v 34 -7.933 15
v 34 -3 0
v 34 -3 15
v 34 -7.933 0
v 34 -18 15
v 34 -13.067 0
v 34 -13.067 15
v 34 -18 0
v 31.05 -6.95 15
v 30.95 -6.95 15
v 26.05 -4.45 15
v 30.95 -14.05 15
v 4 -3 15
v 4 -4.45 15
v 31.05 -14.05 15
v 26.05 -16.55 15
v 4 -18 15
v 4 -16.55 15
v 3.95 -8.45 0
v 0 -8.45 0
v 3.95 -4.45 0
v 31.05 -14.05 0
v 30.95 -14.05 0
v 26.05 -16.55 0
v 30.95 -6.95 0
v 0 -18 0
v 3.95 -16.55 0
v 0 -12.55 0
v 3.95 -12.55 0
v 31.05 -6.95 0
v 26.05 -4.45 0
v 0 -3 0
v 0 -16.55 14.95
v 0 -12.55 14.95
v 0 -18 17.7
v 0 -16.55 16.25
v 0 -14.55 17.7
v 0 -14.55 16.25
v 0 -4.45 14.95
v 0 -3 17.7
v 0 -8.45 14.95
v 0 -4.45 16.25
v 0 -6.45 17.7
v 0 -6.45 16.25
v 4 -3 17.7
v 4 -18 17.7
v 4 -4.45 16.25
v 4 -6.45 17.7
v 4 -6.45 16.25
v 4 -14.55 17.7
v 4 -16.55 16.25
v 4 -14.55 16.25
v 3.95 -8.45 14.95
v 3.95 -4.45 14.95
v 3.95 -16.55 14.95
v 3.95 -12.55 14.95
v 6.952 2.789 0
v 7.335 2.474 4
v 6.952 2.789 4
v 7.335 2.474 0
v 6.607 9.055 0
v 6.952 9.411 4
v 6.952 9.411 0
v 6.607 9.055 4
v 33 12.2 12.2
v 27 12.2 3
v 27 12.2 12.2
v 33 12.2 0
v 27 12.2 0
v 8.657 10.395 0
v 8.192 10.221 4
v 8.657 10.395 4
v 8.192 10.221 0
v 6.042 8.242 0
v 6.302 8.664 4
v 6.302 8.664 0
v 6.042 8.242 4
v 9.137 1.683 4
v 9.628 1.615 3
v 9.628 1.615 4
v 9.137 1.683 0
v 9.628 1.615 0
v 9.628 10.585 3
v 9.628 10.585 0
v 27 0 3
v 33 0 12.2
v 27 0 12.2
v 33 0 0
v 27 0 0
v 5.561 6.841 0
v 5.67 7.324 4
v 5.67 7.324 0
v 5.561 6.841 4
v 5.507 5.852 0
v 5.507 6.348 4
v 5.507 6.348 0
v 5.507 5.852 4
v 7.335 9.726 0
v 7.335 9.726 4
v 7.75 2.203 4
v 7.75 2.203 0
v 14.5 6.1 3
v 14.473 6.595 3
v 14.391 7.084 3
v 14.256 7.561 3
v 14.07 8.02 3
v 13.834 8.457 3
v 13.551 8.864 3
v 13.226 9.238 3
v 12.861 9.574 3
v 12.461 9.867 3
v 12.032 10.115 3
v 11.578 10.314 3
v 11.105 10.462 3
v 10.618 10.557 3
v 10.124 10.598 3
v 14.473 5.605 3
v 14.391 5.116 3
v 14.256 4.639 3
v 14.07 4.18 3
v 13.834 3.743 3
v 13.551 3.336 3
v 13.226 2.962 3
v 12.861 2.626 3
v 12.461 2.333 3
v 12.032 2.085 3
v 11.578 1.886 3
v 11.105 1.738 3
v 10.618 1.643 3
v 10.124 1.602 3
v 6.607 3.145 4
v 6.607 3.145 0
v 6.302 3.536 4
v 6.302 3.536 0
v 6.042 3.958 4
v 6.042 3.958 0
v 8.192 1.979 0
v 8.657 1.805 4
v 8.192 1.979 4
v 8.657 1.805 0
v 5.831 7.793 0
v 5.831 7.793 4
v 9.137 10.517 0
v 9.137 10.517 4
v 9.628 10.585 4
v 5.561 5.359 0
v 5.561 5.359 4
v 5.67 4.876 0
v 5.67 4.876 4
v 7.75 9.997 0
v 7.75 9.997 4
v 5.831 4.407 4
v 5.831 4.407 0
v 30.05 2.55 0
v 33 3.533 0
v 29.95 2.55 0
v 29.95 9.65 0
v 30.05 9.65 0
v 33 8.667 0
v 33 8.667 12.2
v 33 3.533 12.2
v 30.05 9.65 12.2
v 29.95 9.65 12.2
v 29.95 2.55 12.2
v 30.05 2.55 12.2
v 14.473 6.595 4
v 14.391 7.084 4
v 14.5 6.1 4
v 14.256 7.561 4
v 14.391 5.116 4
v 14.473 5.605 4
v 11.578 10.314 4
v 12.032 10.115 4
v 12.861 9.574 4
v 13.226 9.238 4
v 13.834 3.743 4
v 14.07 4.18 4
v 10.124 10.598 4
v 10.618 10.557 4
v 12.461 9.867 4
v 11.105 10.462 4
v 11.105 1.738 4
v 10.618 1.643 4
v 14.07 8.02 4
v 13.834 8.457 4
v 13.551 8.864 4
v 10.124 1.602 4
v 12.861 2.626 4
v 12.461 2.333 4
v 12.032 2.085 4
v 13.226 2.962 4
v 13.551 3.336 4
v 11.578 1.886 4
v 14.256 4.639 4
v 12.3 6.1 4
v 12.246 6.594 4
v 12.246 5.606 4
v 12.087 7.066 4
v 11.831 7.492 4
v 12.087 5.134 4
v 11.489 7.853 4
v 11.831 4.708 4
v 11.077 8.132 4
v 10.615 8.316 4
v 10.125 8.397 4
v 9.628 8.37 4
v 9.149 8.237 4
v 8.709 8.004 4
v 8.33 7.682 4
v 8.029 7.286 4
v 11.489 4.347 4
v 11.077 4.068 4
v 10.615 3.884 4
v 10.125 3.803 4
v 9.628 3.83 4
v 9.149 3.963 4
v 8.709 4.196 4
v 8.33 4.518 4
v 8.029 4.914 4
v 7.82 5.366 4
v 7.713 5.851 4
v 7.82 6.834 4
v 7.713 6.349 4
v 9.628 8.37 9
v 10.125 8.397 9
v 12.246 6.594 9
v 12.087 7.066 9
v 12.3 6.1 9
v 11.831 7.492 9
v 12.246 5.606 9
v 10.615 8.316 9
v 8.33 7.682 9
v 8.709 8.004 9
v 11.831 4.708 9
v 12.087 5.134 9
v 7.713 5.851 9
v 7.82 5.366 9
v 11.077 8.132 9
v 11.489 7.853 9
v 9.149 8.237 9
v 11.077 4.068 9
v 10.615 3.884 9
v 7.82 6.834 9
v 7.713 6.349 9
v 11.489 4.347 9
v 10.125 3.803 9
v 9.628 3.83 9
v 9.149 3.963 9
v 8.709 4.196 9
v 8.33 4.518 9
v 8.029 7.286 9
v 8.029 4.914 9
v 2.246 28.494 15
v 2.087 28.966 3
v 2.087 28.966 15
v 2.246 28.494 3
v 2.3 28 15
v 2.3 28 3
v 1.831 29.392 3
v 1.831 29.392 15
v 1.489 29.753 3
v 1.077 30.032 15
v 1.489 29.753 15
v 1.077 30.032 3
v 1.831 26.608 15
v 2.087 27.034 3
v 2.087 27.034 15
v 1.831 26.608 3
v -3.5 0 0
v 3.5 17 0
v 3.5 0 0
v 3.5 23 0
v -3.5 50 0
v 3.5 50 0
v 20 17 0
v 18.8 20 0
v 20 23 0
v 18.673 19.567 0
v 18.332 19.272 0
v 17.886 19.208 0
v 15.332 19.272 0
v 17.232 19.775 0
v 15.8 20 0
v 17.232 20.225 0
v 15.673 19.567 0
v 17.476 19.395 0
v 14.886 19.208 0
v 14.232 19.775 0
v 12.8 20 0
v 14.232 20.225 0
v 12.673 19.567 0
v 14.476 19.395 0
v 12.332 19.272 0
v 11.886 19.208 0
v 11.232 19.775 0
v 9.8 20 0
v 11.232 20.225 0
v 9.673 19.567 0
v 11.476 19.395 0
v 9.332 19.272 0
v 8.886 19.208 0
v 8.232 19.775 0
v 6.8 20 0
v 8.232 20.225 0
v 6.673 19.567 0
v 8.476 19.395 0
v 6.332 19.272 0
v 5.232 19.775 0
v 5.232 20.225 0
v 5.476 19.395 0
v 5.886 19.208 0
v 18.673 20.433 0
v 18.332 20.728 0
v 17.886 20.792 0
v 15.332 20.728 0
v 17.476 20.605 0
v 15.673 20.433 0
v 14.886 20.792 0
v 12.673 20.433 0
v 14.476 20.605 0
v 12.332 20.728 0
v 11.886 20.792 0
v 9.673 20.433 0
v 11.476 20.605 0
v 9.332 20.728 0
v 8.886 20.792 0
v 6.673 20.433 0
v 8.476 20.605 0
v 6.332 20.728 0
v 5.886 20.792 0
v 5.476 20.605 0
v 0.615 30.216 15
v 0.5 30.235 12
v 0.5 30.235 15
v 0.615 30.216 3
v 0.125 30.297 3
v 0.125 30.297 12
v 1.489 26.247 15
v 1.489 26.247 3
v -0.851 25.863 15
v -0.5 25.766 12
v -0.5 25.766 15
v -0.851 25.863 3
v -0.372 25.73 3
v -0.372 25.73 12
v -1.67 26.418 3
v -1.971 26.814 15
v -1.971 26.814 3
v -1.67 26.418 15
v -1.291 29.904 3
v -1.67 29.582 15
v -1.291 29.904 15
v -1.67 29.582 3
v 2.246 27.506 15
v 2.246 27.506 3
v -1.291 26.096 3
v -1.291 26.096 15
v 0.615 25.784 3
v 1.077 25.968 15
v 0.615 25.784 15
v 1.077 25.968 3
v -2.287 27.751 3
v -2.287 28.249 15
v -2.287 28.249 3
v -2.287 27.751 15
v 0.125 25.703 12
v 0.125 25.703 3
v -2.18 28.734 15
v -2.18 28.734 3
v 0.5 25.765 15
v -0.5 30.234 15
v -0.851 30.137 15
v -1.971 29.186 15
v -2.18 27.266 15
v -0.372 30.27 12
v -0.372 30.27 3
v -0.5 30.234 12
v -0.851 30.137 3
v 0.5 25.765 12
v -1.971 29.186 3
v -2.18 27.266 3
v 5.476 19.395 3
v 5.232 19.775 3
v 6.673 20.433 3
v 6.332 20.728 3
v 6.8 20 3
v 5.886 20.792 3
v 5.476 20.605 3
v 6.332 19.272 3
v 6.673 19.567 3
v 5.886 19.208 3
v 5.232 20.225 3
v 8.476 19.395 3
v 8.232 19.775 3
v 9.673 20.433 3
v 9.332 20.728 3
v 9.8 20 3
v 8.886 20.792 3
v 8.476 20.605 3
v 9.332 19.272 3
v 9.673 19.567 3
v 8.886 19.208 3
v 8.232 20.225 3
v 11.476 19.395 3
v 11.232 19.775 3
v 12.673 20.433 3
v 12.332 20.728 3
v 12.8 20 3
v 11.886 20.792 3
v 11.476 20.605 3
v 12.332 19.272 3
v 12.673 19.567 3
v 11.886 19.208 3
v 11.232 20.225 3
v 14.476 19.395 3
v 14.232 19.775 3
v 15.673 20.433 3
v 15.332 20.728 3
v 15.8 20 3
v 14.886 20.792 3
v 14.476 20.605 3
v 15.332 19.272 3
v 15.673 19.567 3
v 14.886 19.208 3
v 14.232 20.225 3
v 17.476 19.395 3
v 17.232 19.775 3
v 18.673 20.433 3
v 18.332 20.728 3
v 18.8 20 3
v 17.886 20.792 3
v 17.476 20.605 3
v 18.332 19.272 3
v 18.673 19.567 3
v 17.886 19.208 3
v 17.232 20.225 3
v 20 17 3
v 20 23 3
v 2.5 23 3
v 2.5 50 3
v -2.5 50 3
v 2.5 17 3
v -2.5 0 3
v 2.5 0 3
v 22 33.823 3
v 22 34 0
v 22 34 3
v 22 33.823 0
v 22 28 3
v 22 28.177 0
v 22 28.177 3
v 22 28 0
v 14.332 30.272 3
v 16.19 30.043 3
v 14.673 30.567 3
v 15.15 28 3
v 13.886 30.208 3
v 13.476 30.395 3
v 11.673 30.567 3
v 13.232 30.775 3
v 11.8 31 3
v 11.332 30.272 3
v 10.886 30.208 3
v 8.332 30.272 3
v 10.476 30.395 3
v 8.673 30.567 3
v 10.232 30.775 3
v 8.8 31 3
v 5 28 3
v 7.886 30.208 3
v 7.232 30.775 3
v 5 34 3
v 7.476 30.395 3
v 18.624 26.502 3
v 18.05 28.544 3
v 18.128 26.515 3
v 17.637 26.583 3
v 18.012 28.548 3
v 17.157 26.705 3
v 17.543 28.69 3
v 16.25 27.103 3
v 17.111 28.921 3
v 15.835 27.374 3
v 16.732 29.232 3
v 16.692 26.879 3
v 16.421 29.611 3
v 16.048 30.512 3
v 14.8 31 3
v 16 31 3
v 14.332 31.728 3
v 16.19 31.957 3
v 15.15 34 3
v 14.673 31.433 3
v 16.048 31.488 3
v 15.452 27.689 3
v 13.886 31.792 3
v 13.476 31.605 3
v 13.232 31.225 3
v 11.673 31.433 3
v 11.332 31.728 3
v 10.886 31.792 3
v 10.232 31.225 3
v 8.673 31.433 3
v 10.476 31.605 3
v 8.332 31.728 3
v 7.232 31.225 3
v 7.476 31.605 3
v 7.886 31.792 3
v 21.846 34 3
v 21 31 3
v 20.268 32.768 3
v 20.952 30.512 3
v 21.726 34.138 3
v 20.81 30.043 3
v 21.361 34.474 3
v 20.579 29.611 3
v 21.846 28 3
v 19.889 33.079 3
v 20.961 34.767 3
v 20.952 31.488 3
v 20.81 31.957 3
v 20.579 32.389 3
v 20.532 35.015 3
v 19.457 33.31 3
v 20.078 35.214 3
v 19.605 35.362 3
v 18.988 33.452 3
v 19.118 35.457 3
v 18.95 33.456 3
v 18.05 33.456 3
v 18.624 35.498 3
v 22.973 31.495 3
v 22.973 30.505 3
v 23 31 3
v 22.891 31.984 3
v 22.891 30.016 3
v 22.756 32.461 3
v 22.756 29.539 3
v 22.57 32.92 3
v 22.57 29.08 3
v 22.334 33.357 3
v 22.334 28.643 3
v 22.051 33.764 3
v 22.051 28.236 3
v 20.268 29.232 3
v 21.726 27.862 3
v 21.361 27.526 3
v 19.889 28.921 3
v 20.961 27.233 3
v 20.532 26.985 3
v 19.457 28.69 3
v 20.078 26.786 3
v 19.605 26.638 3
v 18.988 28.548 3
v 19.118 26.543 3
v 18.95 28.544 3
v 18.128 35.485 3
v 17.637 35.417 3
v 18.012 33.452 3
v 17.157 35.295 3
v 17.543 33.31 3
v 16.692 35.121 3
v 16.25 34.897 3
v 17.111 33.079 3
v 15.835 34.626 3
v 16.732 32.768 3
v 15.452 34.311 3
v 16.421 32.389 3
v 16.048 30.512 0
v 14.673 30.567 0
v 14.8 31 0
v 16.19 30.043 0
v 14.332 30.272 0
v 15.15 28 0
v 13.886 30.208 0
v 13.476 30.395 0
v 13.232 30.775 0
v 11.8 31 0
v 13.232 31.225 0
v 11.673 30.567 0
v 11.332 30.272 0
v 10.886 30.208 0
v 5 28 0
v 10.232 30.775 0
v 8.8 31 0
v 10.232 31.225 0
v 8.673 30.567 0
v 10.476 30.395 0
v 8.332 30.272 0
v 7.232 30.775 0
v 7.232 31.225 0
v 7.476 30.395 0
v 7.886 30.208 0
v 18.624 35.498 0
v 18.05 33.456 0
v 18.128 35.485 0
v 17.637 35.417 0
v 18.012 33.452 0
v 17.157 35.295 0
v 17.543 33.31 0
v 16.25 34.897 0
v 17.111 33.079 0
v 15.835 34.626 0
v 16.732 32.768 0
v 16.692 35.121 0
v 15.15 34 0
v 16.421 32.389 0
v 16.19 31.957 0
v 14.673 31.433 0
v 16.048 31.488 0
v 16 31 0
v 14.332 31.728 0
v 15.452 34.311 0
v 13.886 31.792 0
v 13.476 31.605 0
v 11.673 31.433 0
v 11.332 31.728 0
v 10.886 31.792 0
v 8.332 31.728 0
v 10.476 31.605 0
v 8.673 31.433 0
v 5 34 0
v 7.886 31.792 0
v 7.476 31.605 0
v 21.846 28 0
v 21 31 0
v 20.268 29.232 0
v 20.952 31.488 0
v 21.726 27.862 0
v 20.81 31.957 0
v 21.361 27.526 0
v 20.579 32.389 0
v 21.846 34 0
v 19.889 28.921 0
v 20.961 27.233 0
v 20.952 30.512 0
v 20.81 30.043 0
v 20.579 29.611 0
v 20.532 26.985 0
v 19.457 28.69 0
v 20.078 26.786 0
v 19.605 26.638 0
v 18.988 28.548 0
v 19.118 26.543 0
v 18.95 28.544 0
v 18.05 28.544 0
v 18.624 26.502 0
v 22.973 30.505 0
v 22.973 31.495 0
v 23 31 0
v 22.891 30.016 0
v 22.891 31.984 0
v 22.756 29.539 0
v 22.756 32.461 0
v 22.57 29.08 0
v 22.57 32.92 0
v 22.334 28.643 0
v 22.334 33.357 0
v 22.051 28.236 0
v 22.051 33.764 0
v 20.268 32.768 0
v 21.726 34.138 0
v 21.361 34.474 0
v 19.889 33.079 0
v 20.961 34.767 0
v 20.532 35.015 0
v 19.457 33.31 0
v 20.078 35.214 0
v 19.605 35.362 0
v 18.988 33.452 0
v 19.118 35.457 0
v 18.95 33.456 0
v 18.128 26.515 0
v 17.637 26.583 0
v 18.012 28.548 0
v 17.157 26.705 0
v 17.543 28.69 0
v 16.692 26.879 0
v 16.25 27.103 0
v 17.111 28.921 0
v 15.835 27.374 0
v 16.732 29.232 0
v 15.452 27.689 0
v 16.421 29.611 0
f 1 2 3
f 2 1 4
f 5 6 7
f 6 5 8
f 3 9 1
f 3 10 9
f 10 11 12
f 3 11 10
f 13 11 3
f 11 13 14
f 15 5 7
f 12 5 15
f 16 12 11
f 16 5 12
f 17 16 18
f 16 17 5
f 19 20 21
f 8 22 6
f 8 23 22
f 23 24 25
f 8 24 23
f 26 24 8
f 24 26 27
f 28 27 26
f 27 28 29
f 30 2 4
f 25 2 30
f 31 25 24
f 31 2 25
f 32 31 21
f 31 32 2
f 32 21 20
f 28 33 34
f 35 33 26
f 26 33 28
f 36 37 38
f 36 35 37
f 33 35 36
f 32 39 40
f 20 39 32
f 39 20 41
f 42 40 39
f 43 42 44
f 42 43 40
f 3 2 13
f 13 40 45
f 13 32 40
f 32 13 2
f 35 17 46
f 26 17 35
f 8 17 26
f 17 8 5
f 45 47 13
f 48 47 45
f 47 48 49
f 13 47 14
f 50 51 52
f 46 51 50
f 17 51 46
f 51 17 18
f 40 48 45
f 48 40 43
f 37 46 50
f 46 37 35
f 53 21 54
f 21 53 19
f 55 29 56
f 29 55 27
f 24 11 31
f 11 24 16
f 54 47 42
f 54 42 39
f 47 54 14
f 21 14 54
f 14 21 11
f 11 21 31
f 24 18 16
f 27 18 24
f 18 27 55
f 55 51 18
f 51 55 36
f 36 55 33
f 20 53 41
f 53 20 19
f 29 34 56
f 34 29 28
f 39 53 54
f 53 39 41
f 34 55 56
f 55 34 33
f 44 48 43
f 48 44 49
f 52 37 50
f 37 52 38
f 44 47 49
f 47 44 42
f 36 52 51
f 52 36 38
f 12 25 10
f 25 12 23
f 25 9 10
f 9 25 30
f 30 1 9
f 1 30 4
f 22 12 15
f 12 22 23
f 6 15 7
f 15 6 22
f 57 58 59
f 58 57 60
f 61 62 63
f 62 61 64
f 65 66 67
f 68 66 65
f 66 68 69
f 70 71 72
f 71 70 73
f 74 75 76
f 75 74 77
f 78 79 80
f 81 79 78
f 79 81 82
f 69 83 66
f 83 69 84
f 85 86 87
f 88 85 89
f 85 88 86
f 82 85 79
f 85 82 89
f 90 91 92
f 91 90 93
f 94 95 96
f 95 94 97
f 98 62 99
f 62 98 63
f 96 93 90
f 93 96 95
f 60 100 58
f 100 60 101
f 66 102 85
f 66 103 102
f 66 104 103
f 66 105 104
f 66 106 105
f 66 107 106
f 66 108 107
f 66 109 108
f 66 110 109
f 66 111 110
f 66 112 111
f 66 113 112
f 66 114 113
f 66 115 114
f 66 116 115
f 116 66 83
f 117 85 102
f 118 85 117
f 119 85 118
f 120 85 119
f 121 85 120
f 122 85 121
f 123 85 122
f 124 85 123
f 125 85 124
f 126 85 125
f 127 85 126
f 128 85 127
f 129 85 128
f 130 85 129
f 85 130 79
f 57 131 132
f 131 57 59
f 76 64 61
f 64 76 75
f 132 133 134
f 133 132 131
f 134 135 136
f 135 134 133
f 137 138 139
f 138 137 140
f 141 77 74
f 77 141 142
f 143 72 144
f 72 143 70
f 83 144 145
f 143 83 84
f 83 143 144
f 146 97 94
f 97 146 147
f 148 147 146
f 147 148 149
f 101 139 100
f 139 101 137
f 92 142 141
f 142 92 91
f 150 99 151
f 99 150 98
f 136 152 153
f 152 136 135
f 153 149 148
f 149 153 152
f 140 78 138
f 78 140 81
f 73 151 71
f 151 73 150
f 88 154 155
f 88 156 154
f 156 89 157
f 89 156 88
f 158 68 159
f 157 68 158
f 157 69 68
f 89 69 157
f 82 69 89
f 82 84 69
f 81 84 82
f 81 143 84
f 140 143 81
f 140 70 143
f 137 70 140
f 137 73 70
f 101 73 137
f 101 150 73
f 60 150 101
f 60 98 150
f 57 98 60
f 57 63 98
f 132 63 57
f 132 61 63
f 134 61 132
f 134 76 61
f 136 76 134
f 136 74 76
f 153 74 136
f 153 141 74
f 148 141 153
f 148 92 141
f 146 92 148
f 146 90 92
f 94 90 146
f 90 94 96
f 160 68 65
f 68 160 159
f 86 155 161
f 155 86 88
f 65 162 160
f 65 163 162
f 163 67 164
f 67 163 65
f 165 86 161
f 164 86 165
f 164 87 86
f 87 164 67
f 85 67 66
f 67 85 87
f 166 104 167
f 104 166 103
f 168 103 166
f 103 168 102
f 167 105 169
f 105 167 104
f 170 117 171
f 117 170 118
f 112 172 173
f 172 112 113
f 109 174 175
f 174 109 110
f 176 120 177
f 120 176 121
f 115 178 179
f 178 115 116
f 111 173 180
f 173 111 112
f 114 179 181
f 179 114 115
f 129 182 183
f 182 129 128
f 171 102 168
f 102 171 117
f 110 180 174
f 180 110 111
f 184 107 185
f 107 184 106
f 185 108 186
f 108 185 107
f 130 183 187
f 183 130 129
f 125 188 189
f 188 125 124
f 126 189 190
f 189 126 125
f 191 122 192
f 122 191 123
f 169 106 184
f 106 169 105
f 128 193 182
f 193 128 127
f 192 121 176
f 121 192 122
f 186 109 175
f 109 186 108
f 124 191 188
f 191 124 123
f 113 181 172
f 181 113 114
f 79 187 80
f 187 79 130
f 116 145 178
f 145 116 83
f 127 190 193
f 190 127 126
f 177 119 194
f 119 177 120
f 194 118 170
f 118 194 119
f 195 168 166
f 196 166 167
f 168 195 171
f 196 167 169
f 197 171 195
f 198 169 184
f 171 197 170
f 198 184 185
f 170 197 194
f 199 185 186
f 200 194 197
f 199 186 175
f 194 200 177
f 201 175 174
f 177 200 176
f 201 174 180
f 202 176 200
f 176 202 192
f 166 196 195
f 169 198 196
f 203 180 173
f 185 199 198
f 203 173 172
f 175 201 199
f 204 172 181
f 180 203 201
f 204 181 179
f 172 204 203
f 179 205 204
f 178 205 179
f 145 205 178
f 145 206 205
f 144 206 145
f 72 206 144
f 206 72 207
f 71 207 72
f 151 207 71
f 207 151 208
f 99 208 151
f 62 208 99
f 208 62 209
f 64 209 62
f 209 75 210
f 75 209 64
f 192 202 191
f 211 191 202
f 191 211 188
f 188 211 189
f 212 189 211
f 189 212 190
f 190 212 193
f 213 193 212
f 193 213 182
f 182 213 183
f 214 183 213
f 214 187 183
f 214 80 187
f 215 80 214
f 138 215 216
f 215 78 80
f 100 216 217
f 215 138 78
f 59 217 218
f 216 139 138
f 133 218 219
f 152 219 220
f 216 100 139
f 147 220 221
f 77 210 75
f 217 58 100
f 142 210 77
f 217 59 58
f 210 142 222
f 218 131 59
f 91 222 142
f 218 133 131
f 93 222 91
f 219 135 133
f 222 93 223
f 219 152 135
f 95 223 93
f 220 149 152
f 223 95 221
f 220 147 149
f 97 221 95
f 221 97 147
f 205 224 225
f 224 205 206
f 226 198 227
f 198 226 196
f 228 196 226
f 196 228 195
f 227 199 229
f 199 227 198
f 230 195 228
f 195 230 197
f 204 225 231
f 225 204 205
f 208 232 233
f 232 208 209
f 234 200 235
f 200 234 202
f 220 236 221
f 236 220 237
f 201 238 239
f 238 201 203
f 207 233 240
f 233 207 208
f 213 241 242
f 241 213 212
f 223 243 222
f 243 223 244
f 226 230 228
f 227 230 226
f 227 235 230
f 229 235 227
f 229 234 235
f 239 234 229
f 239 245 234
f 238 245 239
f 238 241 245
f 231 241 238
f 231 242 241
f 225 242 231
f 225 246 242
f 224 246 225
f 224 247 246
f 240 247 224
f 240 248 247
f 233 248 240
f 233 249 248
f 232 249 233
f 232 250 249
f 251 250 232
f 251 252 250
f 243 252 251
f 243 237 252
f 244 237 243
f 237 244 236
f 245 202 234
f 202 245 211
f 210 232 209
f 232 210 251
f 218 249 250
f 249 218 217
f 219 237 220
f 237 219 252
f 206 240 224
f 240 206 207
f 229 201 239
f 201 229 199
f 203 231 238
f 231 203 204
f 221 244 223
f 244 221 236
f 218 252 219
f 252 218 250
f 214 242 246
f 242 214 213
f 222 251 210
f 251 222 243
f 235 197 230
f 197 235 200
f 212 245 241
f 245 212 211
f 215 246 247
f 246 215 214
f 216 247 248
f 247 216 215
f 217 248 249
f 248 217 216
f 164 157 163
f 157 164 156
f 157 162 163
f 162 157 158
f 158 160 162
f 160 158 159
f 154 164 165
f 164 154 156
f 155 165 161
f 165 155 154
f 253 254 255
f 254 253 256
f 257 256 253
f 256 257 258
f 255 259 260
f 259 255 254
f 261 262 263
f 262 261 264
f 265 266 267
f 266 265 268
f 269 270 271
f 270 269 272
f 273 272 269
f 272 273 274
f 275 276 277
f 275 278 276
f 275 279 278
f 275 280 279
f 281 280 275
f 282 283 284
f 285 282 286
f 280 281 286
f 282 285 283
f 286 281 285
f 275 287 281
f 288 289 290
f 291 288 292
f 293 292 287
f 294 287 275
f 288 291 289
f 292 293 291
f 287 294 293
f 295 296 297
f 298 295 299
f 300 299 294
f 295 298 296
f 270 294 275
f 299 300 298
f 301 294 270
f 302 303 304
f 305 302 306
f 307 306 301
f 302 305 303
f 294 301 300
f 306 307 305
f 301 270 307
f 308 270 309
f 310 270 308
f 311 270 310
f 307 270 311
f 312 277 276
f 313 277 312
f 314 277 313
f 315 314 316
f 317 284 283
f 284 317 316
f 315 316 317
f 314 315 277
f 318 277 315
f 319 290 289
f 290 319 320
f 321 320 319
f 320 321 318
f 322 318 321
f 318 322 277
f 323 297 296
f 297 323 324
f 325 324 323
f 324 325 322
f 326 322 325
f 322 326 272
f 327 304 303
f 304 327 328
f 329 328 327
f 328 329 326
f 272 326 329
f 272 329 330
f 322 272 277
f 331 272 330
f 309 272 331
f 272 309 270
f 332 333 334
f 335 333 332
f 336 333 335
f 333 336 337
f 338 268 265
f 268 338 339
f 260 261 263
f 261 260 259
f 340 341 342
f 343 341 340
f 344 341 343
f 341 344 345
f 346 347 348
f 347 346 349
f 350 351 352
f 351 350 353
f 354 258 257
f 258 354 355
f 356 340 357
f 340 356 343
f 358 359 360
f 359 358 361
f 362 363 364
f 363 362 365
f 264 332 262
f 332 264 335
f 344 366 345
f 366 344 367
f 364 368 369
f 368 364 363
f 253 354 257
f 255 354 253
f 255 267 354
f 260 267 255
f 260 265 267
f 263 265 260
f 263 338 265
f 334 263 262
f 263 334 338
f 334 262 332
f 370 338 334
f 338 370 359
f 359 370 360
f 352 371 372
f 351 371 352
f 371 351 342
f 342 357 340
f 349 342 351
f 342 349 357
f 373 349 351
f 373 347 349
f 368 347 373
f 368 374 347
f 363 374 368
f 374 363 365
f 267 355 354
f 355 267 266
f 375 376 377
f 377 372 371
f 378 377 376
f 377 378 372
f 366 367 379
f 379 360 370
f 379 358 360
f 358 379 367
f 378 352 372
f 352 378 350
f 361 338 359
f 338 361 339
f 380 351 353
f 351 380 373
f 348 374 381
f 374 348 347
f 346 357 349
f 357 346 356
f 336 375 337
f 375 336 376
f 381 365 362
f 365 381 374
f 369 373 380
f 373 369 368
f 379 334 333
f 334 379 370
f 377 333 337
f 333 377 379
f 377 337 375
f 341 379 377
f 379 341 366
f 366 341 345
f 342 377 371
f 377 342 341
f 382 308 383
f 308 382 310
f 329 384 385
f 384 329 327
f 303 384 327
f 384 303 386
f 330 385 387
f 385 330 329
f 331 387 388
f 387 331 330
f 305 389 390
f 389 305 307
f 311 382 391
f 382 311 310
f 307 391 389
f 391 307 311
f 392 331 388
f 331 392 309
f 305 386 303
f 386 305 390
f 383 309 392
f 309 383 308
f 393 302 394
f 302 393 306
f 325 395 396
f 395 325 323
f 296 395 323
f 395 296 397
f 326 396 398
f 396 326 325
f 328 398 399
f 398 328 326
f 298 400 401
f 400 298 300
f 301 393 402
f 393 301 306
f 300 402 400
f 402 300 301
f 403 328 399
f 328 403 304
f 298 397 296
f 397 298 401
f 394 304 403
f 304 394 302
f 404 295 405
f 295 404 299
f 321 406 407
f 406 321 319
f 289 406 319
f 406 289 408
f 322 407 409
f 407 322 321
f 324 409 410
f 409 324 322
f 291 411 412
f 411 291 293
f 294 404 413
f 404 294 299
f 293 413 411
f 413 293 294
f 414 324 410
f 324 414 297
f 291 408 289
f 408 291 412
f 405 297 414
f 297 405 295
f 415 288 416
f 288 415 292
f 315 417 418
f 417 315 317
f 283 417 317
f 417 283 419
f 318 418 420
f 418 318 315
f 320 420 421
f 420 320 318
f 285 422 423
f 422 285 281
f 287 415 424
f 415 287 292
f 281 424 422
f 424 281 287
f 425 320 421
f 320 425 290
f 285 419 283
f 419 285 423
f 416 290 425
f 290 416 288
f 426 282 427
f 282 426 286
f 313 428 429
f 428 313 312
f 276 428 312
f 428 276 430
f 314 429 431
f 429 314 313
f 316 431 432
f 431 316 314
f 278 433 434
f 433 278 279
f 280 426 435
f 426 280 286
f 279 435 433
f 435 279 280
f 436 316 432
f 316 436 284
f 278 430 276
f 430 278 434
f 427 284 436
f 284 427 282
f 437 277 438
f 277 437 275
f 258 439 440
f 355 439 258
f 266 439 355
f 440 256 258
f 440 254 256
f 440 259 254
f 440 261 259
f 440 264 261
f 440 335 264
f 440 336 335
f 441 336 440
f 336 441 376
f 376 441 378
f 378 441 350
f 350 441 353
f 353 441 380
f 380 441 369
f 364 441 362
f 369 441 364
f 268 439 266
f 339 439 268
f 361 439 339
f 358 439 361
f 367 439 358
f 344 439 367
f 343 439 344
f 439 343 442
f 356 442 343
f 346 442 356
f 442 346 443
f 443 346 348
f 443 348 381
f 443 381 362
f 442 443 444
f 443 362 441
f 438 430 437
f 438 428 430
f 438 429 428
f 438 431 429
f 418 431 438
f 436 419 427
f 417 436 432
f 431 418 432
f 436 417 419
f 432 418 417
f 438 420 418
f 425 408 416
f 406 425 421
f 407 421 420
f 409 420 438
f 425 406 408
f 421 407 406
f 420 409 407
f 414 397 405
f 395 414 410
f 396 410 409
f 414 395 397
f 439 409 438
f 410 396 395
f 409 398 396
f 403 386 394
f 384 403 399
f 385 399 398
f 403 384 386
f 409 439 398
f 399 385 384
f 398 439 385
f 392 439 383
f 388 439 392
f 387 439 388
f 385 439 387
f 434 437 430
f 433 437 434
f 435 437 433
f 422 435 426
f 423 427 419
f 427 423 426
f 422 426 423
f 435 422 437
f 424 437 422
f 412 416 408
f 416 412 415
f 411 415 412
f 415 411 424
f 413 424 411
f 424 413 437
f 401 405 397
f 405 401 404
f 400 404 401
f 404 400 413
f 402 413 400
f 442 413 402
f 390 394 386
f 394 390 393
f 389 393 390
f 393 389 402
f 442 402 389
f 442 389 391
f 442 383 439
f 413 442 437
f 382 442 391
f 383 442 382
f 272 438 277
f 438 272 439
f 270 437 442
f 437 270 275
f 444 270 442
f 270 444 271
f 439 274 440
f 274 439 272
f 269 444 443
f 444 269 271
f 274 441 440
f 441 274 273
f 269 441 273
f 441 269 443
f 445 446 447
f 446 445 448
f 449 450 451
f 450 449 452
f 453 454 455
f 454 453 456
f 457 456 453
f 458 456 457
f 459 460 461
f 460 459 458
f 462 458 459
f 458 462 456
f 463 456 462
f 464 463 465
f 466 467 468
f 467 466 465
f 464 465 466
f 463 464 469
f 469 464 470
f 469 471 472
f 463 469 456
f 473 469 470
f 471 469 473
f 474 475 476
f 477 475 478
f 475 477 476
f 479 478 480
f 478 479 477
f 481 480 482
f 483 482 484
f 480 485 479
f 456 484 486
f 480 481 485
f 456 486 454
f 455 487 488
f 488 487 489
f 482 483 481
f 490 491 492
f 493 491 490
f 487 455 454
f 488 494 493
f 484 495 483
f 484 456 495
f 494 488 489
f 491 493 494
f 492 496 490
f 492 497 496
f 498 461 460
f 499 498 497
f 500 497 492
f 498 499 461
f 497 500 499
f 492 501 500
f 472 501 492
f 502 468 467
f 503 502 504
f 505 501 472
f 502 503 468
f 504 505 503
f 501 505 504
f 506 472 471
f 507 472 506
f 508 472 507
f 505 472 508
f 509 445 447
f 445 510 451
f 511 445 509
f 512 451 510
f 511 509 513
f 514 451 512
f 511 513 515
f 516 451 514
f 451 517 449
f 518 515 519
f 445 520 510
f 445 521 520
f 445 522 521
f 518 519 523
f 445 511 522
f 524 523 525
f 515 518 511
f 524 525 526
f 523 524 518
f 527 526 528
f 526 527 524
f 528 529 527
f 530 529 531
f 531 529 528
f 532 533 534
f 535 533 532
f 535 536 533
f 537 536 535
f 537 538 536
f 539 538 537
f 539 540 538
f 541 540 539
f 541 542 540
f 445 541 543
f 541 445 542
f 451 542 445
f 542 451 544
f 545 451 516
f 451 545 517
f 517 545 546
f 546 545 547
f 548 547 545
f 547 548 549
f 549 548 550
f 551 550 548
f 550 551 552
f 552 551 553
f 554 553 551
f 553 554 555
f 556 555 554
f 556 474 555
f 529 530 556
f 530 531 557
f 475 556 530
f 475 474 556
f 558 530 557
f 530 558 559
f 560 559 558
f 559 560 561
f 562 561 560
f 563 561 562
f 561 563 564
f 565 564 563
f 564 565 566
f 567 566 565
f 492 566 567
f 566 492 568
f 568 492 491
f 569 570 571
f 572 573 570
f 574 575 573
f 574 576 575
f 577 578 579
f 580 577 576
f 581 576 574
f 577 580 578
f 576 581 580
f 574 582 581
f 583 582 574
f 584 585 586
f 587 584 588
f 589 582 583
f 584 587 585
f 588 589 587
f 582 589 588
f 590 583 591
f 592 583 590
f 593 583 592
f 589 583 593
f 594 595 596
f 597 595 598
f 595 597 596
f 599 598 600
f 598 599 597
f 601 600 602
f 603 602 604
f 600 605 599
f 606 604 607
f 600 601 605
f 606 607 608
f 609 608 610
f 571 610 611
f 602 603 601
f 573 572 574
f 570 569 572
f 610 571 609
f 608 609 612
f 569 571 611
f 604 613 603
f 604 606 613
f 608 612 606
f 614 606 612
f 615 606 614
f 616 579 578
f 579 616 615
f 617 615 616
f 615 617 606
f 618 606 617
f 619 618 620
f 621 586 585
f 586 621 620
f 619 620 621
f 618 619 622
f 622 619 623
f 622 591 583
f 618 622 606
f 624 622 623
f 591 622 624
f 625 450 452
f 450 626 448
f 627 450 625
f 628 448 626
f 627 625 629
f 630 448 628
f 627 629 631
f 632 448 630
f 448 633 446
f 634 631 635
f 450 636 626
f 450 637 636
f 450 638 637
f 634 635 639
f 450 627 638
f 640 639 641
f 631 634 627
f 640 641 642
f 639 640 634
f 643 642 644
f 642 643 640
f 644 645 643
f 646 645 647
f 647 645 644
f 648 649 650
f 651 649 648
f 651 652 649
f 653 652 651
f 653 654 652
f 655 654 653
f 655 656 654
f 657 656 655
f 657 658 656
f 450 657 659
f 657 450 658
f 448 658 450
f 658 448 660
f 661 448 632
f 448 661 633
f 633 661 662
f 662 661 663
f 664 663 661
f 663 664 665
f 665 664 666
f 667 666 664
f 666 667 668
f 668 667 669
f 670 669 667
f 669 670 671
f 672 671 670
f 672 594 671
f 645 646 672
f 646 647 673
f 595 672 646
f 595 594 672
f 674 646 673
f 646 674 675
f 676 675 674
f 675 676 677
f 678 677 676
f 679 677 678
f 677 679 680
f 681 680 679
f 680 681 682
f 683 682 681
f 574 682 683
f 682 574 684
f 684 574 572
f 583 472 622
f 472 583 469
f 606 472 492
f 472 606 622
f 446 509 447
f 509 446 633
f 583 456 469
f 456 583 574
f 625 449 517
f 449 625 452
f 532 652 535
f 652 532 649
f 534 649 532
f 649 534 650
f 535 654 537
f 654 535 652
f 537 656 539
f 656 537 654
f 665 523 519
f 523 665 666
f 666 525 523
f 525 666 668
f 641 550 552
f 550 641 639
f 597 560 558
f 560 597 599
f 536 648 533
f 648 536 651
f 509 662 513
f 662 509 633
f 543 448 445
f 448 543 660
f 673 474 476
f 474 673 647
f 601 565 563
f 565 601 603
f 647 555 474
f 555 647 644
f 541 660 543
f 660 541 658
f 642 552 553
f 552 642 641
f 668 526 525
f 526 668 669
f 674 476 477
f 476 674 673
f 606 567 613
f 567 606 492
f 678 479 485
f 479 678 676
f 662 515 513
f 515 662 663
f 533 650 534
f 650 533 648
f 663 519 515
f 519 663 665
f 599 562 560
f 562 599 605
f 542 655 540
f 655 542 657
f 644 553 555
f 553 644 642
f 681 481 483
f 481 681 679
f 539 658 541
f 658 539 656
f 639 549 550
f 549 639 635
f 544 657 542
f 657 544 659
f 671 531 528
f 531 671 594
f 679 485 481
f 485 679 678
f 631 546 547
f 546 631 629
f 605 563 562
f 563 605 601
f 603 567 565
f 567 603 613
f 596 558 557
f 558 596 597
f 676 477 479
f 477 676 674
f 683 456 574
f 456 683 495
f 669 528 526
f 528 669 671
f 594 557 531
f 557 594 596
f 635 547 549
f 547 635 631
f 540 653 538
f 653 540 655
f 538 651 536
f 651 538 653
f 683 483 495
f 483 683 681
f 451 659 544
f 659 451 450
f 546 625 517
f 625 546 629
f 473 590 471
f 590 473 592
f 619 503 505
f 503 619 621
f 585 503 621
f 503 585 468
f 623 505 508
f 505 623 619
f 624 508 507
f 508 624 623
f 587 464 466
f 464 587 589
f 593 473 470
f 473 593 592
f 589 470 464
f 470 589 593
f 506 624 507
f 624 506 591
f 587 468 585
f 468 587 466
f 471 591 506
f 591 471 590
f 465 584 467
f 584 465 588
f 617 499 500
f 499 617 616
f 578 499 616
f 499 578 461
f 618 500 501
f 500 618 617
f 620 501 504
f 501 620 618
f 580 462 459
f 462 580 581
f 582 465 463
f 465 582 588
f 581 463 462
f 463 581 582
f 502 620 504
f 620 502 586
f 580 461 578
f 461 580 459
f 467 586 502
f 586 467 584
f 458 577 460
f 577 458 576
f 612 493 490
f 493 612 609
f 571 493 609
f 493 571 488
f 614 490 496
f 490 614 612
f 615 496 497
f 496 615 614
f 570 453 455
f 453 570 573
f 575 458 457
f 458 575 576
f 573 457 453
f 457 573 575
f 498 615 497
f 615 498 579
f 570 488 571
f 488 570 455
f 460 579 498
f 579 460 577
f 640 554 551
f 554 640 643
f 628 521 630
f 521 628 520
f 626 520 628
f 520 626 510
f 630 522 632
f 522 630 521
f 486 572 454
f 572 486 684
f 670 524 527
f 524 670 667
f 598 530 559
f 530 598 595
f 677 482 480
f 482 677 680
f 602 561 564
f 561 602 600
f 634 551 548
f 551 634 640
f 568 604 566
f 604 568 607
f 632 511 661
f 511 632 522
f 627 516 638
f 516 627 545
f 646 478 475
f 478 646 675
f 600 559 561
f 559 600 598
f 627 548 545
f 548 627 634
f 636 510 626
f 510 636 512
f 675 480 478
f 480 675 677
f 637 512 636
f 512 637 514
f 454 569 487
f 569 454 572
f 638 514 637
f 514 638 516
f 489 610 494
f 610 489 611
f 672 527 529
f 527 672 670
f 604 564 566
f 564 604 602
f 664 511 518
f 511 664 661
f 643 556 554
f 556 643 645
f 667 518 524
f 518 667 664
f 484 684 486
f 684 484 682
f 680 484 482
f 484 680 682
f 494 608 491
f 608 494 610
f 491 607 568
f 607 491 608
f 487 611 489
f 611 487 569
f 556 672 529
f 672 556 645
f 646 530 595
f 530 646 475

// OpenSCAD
$fa=4;
$fs=0.5;

//for a wheel of radius 30mm and axle 5mm diameter

tolerance = 0.1;

thickness = 3;
wheel_width = 10;
wheel_gap = 0.1;
fork_lip = 1;
axle_radius = 2.5;
fork_thickness = 2;


//servo size
sWidth = 12;
sHeight= 22;
sAxisOffset = 6;
sMountSize = 4;
sMountZ = 1.2;

//derived
cor = max(30/2 + 2, sHeight - sAxisOffset); //center of rotation
width = wheel_width + 2*wheel_gap + 2*fork_lip;

//objects

translate([0,-18,0]) active_half();
translate([27,0,0]) passive_half();
translate([0,0,0]) support_beam();
translate([5,28,0]) servo_connector();

//trapeze(thickness,10,7,5);


////////////////
////////////////
////////////////

module support_beam() {
	length=50;
	offset1=28;
	offset2=20;
	union(){
		trapeze(3,length,7,5);
		translate([0,offset1,0]){
			difference(){
				cylinder(r=axle_radius-0.2, h=15);
				translate([-0.5,-5,15-thickness]) cube([1,10,thickness]);
			}
		}
		translate([0,offset2,0]){
			translate([0,-3,0]) difference(){
				cube([20,6,thickness]);
				for(i = [0 : 4]) {
					translate([6+i*3,3,-0.5]) cylinder(r=0.8,h=thickness+1);
				}
			}
		}
	}
}

module servo_connector() {
	union() {
		difference() {
			union() {
				cube([17,6,thickness]);
				translate([27/2,3,0]) cylinder(r=4.5,h=thickness);
			}
			for(i = [1,2,3]) {
				translate([i*3,3,-0.5]) cylinder(r=0.8,h=thickness+1);
			}
			translate([27/2,3,-1]) cylinder(r=2.5,h=thickness+2);
		}
		translate([27/2-(1-tolerance)/2, 0, 0]) cube([1-tolerance,6,thickness]);
	}
}

module active_half() {
	dx = cor - (sHeight - sAxisOffset);
	difference(){
		union(){
			cube([thickness+2*sMountSize+sHeight+dx,sWidth+thickness,15]);
			cube([sMountSize,sWidth+thickness,15+sMountZ+thickness/2]);
		}
		translate([sMountSize,thickness/2,0]) bigger() cube([sHeight,sWidth,15]);
		translate([0,thickness/2+sWidth/2-2,0]) bigger() cube([sMountSize,4,20]);
		translate([0,thickness/2+2,15]) bigger() cube([sMountSize,sWidth-4,20]);
		translate([0,thickness/2,15]) bigger() cube([sMountSize,sWidth,sMountZ]);
		translate([2*sMountSize+sHeight+dx,thickness/2+sWidth/2])
			rotate([0,90,0])
				rotate([0,0,90])
					bigger()
						trapeze(3,15,7,5);
	}
}

module passive_half() {
	difference() {
		union(){
			hull(){
				cube([thickness,width,thickness]);
				translate([-cor,width/2,0])
					cylinder(r=axle_radius+fork_thickness, h=thickness);
			}
			cube([2*thickness,width,width]);
			translate([-cor,width/2,0])
				cylinder(r=axle_radius+fork_thickness, h=thickness+fork_lip);
			translate([-cor,width/2,0])
				cylinder(r=axle_radius-0.2, h=thickness+fork_lip+5);
		}
		translate([thickness,width/2,0])
			rotate([0,90,0])
				rotate([0,0,90])
					bigger()
						trapeze(3,15,7,5);
	}
}

module trapeze(h, w, r1, r2, center = false) {
	rotate([-90,0,0]) linear_extrude(height = w) projection(false) rotate([90,0,0]) cylinder(h, r1/2, r2/2, center);
}

module bigger(t = tolerance) {
	minkowski() {
		children(0);
		cube(t, true);
	}
}
